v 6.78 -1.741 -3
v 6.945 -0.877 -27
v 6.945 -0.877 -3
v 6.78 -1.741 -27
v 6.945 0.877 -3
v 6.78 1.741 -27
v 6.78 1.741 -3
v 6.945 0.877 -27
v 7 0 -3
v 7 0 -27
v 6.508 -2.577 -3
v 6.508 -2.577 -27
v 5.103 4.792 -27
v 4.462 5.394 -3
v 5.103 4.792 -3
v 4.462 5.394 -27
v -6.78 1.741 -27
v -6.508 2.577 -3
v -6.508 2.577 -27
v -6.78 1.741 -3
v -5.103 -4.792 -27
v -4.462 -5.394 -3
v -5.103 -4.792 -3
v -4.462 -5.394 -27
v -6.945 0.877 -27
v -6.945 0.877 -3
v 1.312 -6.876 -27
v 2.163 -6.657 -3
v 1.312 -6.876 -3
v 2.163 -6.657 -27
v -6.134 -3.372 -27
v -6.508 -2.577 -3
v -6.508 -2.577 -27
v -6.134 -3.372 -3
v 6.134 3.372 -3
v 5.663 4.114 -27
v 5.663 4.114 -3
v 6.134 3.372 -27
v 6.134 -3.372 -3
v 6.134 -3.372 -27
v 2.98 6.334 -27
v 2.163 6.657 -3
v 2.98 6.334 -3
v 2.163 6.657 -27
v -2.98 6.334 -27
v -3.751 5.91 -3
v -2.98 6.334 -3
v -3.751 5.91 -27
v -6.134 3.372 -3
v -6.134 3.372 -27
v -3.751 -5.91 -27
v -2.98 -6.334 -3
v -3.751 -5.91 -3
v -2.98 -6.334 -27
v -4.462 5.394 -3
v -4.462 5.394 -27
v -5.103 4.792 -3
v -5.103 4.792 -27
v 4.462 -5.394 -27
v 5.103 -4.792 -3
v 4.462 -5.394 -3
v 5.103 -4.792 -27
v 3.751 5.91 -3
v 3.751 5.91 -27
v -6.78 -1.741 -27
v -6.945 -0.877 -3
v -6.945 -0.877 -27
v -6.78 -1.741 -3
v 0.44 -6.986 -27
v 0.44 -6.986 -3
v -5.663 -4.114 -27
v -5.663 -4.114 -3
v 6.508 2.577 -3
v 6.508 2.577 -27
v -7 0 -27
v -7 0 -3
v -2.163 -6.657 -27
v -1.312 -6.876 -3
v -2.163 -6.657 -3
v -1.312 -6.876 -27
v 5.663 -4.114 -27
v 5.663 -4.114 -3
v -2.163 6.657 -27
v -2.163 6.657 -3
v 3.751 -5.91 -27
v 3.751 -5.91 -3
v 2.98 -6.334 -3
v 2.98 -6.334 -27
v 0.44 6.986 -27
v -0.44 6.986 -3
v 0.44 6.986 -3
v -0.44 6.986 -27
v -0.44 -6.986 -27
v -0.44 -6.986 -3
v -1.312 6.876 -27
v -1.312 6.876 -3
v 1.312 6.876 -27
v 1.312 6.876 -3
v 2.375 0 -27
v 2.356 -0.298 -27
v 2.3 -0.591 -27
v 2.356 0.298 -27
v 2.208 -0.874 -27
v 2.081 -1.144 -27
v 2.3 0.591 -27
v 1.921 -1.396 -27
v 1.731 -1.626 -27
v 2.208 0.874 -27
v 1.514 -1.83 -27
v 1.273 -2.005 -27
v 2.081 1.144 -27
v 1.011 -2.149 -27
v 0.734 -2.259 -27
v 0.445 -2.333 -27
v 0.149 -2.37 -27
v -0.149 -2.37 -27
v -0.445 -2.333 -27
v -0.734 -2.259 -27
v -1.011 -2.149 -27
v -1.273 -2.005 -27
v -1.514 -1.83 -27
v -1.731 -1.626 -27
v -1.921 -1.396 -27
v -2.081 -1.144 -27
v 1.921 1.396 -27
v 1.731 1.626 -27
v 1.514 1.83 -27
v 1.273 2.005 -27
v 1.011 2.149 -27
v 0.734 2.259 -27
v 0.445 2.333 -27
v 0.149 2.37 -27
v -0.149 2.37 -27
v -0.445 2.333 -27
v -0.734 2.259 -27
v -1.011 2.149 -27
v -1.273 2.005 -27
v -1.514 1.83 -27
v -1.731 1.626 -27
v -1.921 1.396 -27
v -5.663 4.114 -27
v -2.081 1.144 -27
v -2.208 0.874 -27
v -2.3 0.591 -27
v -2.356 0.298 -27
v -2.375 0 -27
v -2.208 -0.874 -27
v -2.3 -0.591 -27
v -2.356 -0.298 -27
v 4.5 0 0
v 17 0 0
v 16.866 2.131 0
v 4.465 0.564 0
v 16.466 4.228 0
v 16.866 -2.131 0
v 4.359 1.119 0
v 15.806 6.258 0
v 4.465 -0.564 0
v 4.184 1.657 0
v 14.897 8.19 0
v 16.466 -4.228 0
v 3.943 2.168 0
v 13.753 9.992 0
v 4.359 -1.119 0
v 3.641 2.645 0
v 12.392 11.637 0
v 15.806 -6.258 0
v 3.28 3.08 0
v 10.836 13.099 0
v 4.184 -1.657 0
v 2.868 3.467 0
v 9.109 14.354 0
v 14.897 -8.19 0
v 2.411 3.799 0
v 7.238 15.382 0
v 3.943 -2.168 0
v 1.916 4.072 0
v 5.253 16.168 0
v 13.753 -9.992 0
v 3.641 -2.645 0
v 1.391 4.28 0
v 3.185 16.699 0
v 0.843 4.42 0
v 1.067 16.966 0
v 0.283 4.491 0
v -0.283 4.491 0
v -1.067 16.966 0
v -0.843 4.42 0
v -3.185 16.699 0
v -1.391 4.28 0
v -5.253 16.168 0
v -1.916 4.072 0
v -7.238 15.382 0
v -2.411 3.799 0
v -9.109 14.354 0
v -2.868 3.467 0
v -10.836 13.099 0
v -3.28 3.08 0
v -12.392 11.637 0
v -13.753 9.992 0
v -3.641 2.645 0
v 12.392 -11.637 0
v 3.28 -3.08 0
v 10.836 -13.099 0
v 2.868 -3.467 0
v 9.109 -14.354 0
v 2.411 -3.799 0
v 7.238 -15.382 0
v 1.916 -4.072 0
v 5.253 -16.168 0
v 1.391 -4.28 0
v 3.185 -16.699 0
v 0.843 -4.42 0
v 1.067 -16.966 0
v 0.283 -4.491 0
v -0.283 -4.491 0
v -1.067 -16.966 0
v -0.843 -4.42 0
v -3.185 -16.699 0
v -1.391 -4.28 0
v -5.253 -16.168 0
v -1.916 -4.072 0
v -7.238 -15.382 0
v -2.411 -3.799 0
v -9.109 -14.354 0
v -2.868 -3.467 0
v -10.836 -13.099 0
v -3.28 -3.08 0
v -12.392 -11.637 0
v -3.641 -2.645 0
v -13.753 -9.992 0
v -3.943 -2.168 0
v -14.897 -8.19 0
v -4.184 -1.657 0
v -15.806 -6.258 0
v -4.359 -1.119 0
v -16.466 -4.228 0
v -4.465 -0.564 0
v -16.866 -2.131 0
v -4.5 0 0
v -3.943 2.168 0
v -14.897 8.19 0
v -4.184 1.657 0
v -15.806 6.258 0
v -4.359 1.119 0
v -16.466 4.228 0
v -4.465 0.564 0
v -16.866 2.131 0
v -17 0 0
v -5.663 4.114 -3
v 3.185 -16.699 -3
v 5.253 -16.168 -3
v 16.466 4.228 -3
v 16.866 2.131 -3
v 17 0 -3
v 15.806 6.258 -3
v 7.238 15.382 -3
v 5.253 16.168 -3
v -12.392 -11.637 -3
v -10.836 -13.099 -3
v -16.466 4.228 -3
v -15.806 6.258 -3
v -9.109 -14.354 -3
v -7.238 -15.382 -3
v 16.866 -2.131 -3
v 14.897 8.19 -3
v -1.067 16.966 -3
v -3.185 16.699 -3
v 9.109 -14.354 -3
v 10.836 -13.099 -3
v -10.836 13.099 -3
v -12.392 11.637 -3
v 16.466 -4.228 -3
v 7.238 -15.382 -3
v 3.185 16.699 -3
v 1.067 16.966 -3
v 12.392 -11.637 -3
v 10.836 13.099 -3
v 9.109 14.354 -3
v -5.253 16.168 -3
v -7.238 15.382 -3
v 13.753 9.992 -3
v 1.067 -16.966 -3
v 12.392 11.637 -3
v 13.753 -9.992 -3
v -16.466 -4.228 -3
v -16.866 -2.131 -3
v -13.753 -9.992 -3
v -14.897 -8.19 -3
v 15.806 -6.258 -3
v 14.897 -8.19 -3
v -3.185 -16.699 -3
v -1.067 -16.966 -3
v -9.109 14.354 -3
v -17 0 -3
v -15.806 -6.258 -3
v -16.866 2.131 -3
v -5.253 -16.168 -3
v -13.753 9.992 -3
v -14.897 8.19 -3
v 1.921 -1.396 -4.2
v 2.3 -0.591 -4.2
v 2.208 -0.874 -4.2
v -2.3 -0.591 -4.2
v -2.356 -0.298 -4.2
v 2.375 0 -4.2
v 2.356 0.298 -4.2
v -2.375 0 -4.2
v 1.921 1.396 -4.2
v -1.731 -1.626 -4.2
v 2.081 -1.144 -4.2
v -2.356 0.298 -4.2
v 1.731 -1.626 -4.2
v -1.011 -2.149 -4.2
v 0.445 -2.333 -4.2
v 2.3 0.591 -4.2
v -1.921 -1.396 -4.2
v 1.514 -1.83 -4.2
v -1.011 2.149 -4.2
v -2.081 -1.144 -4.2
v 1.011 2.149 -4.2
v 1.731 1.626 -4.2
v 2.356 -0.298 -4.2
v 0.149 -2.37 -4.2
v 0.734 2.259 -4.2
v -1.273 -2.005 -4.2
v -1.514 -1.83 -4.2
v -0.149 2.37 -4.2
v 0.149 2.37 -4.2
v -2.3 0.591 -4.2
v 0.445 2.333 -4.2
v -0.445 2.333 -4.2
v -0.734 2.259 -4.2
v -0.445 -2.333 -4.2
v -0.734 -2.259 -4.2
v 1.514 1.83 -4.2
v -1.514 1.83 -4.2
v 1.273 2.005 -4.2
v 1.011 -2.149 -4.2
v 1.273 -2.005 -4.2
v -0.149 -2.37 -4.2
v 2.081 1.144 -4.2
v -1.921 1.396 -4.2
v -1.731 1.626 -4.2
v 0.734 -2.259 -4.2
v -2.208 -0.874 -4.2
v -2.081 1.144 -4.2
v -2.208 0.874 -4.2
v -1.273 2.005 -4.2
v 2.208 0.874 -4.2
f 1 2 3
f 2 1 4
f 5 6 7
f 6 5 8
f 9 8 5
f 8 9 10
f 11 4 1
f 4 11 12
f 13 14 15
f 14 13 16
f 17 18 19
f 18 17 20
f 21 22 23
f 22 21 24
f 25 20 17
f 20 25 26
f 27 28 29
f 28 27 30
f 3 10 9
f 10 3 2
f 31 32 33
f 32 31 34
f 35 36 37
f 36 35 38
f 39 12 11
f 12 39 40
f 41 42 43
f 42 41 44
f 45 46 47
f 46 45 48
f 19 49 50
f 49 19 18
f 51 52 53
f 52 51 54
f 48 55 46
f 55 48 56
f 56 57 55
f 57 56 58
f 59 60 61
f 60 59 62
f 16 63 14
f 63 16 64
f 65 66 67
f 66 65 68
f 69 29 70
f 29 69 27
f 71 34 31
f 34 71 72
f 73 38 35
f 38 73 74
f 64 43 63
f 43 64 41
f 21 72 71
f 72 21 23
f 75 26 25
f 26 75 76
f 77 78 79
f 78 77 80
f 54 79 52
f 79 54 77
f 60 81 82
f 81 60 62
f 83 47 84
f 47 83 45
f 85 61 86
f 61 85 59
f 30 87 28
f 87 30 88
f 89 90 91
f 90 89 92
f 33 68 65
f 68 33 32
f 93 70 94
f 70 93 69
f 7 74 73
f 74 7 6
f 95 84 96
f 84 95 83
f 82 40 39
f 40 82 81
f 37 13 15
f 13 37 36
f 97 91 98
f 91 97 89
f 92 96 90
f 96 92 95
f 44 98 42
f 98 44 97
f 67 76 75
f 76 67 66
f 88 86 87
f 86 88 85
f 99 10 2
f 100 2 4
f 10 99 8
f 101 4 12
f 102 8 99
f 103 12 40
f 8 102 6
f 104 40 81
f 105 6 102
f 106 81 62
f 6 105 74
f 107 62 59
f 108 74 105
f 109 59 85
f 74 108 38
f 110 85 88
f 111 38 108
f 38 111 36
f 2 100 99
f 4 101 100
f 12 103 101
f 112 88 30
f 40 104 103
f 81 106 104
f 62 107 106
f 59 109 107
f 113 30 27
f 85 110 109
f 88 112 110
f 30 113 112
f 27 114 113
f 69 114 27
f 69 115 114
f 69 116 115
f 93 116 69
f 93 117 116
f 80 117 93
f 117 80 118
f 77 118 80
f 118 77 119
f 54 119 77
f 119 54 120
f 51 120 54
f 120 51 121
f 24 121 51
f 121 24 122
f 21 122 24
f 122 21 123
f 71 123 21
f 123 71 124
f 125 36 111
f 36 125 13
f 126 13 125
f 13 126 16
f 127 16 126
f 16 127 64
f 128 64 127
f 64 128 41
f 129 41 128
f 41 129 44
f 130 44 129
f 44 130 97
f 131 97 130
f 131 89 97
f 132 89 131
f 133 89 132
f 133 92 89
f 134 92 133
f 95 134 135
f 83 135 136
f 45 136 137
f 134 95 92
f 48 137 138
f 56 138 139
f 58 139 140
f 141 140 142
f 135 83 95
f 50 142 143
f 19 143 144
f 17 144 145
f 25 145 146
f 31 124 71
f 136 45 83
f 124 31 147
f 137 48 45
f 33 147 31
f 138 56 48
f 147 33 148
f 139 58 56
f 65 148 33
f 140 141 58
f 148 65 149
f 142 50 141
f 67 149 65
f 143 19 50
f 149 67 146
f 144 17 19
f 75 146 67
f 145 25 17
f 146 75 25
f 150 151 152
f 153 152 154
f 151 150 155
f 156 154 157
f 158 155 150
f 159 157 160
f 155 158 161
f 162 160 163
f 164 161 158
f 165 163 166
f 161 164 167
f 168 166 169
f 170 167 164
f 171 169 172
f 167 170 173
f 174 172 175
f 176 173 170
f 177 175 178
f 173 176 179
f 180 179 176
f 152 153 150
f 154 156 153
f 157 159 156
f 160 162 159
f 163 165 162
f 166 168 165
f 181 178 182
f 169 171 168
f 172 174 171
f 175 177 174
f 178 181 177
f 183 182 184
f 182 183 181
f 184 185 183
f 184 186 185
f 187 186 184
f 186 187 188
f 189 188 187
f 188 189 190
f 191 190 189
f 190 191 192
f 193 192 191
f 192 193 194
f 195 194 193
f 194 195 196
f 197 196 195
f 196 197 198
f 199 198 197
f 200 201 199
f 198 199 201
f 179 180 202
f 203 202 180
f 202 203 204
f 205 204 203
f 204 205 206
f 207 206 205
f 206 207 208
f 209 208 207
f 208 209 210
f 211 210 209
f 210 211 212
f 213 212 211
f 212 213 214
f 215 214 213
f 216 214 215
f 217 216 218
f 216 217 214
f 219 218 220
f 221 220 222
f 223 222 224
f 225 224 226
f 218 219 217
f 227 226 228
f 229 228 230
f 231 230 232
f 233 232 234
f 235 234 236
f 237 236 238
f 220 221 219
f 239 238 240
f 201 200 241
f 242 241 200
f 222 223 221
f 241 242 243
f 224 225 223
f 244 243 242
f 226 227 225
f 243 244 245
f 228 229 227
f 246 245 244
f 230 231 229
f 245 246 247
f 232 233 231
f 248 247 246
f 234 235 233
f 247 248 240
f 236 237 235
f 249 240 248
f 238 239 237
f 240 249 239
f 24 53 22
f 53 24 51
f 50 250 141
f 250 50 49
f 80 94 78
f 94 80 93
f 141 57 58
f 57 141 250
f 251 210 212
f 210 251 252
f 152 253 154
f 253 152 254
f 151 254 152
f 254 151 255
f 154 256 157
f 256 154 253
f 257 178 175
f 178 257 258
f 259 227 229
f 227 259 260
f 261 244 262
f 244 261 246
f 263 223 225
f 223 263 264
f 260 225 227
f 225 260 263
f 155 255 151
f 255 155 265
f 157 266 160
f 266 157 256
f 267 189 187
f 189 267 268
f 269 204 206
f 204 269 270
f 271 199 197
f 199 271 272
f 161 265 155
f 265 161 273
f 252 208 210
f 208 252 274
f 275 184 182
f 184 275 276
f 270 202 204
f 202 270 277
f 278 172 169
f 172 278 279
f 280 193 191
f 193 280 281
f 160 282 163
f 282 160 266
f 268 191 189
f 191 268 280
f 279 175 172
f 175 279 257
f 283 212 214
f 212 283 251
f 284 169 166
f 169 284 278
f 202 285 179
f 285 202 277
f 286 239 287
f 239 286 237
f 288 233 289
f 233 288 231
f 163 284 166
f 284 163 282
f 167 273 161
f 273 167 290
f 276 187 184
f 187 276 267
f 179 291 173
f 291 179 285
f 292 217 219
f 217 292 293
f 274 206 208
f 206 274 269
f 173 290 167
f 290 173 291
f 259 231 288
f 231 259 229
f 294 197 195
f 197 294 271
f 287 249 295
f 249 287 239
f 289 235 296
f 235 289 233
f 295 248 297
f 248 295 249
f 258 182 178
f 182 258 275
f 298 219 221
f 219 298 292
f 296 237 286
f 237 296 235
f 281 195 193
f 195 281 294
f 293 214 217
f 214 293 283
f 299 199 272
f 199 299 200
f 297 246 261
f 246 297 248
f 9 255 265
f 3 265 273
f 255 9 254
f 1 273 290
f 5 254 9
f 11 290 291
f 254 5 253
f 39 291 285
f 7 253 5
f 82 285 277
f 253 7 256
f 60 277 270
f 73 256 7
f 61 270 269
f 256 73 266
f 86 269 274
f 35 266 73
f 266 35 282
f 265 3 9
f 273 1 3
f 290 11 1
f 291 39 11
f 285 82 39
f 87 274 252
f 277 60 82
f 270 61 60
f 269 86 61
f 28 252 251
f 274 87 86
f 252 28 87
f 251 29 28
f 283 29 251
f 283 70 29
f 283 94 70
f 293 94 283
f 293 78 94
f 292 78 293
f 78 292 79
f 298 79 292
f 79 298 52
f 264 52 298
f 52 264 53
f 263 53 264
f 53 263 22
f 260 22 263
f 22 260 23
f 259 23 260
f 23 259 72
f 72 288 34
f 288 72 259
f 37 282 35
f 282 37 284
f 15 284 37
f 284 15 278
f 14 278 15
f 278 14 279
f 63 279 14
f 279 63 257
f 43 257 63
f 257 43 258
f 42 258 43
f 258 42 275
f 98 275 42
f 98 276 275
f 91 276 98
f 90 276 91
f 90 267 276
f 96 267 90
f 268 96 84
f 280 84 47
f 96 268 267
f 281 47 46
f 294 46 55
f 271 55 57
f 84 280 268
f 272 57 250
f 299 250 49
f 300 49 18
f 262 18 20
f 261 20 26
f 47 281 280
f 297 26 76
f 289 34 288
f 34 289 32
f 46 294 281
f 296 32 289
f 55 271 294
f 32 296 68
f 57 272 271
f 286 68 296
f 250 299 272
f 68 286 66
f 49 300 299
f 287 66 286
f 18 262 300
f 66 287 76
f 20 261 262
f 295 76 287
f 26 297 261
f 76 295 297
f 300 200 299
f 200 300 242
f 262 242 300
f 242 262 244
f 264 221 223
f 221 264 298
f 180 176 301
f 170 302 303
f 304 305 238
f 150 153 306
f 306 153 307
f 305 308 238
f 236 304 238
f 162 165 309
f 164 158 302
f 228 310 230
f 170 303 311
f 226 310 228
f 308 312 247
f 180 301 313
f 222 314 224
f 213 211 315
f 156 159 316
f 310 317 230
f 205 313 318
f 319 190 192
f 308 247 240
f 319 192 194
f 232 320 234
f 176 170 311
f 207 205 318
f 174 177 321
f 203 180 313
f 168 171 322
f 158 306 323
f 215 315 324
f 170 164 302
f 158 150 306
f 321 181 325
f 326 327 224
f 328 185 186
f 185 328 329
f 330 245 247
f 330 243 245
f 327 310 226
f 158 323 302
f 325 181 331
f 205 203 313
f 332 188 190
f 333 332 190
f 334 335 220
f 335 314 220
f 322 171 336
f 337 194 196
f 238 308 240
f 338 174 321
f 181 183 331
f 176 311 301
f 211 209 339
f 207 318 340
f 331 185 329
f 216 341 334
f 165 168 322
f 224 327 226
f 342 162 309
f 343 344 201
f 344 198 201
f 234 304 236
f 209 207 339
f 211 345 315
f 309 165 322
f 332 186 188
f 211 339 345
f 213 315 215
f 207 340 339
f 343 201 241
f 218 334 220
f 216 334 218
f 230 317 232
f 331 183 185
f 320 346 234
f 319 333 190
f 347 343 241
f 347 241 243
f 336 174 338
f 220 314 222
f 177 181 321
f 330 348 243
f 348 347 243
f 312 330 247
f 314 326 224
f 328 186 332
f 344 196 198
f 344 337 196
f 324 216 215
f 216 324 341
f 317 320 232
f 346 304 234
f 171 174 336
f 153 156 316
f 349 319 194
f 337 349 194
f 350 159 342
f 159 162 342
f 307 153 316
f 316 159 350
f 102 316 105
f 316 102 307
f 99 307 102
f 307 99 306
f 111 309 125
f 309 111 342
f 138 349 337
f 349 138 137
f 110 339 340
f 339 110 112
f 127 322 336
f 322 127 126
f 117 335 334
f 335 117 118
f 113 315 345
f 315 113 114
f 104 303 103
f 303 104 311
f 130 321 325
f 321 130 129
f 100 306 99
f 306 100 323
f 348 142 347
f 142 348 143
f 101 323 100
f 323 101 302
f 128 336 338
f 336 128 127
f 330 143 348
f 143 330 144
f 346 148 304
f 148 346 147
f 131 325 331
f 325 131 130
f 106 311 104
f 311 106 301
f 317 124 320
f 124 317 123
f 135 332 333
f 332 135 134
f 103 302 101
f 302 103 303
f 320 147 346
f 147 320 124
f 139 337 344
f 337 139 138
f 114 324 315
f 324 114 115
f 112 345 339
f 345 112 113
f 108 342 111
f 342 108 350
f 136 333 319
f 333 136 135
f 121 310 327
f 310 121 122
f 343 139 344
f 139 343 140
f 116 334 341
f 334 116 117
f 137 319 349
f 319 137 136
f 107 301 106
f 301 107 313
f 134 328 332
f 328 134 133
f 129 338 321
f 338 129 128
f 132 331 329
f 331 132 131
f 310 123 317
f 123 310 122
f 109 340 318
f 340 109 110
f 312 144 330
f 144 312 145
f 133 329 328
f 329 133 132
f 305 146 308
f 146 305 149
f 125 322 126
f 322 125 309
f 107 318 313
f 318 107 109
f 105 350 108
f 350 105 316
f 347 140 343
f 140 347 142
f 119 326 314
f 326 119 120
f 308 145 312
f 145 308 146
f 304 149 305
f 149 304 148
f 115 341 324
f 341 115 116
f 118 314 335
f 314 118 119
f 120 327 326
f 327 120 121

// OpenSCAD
$fn = 50;


difference() {
	union() {
		translate(v = [0, 0, -27.0000000000]) {
			cylinder(h = 27, r = 7.0000000000);
		}
		translate(v = [0, 0, -3.0000000000]) {
			cylinder(h = 3, r = 17.0000000000);
		}
	}
	union() {
		translate(v = [0, 0, 0]) {
			rotate(a = [0, 0, 0]) {
				difference() {
					union() {
						#translate(v = [0, 0, -27.0000000000]) {
							cylinder(h = 27, r = 2.2500000000);
						}
						#translate(v = [0, 0, -4.2000000000]) {
							cylinder(h = 4.2000000000, r = 7.0000000000, r1 = 2.3750000000, r2 = 4.5000000000);
						}
						#translate(v = [0, 0, -27.0000000000]) {
							cylinder(h = 27, r = 2.3750000000);
						}
						#translate(v = [0, 0, -27.0000000000]) {
							cylinder(h = 27, r = 2.2500000000);
						}
					}
					union();
				}
			}
		}
	}
}
